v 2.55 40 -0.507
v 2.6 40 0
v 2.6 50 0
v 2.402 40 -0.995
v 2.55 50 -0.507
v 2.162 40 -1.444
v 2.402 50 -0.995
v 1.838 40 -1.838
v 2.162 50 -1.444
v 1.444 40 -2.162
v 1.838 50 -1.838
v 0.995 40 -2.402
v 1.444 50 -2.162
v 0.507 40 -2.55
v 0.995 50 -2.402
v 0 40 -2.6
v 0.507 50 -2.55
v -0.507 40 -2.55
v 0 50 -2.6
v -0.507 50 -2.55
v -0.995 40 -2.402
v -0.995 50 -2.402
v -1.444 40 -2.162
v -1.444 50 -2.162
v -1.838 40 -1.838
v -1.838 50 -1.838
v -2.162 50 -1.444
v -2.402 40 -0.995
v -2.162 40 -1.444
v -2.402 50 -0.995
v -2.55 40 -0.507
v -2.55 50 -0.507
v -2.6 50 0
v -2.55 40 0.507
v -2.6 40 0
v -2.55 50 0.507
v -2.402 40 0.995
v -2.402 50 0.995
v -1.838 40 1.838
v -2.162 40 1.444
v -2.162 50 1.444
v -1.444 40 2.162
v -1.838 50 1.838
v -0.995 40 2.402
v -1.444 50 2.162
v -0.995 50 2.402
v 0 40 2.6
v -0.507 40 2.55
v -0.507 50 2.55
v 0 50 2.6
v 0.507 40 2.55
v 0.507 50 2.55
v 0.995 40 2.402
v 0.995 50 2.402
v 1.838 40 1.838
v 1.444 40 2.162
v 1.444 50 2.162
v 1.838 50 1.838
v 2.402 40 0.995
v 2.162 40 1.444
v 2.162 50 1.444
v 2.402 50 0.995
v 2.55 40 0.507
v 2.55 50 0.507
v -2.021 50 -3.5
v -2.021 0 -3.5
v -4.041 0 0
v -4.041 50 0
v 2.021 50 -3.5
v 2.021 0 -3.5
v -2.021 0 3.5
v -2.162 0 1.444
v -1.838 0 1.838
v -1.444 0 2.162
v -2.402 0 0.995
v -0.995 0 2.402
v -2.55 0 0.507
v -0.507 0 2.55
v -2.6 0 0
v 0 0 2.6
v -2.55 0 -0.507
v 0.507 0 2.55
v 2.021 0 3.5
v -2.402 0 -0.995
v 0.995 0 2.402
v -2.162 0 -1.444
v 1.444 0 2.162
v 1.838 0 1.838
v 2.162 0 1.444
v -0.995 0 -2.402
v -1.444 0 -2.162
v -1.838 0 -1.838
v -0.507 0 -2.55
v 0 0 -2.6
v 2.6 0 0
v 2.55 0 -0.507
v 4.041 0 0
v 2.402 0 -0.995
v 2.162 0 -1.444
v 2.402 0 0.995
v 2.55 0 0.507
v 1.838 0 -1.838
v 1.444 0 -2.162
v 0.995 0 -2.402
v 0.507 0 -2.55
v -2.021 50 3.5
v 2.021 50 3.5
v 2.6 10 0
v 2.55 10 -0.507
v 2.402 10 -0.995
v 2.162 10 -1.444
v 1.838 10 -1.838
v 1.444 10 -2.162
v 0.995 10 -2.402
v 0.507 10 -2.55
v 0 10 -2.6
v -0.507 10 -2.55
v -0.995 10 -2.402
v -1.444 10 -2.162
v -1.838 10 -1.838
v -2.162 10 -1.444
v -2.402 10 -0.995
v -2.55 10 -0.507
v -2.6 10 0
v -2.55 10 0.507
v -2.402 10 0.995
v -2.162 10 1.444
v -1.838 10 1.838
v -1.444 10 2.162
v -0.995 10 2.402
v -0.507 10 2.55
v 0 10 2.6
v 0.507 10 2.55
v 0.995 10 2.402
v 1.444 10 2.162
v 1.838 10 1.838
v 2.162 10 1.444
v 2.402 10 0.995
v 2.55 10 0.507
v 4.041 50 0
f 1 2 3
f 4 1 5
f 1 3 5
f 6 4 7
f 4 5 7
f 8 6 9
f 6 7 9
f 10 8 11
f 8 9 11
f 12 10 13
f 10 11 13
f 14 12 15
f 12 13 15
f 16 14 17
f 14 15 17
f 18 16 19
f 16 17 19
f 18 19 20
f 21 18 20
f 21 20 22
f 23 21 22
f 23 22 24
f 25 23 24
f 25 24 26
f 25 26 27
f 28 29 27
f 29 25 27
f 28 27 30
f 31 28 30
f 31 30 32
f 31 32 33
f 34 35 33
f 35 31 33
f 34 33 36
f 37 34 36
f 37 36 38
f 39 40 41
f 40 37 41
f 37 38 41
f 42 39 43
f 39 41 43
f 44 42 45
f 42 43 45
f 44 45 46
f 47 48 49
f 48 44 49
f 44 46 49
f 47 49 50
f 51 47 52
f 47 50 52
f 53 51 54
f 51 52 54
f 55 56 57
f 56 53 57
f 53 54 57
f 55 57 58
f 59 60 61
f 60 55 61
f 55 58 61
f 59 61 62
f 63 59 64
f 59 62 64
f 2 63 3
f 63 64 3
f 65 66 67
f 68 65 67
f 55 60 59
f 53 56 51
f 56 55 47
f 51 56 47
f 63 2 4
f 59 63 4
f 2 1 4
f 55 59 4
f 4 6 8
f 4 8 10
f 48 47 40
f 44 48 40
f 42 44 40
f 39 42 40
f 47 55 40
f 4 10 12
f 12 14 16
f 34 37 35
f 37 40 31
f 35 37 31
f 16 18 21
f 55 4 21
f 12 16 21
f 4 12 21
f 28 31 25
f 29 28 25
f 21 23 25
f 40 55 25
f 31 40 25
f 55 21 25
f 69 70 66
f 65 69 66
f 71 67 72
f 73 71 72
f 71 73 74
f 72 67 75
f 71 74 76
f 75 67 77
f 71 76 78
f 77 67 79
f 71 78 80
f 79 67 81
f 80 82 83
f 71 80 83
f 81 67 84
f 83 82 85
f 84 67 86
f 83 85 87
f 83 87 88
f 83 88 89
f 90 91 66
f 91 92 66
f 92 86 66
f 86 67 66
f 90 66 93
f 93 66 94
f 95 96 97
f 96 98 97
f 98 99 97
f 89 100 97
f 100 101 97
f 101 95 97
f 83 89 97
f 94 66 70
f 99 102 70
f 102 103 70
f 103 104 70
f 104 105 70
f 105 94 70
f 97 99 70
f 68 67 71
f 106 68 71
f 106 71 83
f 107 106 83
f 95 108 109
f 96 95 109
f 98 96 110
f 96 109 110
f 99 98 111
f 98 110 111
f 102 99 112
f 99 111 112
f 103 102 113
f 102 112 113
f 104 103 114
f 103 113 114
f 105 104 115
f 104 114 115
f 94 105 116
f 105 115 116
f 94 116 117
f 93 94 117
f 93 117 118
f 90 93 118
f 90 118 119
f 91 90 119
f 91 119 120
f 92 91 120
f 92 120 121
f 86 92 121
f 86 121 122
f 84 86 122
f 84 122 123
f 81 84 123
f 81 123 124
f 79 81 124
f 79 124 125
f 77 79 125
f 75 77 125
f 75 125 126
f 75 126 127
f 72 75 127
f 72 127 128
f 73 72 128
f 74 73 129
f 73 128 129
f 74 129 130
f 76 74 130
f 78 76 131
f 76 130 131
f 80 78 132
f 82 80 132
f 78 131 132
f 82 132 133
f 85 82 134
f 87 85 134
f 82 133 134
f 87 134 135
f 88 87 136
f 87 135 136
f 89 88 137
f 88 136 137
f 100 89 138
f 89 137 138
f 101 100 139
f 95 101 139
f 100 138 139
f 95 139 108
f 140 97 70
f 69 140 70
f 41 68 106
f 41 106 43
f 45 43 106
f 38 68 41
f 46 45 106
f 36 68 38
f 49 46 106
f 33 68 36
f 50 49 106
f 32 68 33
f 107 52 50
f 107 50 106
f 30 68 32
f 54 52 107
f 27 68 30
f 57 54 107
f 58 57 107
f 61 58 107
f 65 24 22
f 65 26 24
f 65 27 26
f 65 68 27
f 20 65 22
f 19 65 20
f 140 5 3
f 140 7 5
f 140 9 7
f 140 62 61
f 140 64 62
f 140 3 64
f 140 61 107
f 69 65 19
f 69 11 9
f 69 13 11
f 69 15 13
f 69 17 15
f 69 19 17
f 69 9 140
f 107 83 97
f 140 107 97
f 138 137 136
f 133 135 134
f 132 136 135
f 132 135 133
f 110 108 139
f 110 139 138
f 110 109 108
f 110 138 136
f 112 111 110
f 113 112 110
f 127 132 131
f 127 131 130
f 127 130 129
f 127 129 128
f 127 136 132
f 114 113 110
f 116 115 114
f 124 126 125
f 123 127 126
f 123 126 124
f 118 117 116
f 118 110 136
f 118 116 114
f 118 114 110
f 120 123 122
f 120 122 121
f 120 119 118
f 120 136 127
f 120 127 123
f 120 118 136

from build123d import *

# Parameters (mm, degrees)
EXTRUDE_1_DEPTH     = 50
SKETCH_2_R          = 2.6
CUT_EXTRUDE_1_DEPTH = 51
SKETCH_3_R          = 2.6
EXTRUDE_2_DEPTH     = 30


with BuildPart() as part:
    # 草图1 → 凸台-拉伸1 (new body)
    with BuildSketch(Plane(origin=(0, 0, 0), x_dir=(1, 0, 0), z_dir=(0, 1, 0))):
        Polygon((4.041451884, 0), (2.020725942, 3.5), (-2.020725942, 3.5), (-4.041451884, 0), (-2.020725942, -3.5), (2.020725942, -3.5), align=None)
    extrude(amount=EXTRUDE_1_DEPTH)

    # 草图2 → 切除-拉伸1 (cut, through all)
    with BuildSketch(Plane(origin=(0, 50, 0), x_dir=(1, 0, 0), z_dir=(0, 1, 0))):
        Circle(SKETCH_2_R)
    extrude(amount=-CUT_EXTRUDE_1_DEPTH, mode=Mode.SUBTRACT)

    # 草图3 → 凸台-拉伸2 (add)
    with BuildSketch(Plane(origin=(0, 10, 0), x_dir=(-1, 0, 0), z_dir=(0, -1, 0))):
        Circle(SKETCH_3_R)
    extrude(amount=-EXTRUDE_2_DEPTH)


solid = part.part
